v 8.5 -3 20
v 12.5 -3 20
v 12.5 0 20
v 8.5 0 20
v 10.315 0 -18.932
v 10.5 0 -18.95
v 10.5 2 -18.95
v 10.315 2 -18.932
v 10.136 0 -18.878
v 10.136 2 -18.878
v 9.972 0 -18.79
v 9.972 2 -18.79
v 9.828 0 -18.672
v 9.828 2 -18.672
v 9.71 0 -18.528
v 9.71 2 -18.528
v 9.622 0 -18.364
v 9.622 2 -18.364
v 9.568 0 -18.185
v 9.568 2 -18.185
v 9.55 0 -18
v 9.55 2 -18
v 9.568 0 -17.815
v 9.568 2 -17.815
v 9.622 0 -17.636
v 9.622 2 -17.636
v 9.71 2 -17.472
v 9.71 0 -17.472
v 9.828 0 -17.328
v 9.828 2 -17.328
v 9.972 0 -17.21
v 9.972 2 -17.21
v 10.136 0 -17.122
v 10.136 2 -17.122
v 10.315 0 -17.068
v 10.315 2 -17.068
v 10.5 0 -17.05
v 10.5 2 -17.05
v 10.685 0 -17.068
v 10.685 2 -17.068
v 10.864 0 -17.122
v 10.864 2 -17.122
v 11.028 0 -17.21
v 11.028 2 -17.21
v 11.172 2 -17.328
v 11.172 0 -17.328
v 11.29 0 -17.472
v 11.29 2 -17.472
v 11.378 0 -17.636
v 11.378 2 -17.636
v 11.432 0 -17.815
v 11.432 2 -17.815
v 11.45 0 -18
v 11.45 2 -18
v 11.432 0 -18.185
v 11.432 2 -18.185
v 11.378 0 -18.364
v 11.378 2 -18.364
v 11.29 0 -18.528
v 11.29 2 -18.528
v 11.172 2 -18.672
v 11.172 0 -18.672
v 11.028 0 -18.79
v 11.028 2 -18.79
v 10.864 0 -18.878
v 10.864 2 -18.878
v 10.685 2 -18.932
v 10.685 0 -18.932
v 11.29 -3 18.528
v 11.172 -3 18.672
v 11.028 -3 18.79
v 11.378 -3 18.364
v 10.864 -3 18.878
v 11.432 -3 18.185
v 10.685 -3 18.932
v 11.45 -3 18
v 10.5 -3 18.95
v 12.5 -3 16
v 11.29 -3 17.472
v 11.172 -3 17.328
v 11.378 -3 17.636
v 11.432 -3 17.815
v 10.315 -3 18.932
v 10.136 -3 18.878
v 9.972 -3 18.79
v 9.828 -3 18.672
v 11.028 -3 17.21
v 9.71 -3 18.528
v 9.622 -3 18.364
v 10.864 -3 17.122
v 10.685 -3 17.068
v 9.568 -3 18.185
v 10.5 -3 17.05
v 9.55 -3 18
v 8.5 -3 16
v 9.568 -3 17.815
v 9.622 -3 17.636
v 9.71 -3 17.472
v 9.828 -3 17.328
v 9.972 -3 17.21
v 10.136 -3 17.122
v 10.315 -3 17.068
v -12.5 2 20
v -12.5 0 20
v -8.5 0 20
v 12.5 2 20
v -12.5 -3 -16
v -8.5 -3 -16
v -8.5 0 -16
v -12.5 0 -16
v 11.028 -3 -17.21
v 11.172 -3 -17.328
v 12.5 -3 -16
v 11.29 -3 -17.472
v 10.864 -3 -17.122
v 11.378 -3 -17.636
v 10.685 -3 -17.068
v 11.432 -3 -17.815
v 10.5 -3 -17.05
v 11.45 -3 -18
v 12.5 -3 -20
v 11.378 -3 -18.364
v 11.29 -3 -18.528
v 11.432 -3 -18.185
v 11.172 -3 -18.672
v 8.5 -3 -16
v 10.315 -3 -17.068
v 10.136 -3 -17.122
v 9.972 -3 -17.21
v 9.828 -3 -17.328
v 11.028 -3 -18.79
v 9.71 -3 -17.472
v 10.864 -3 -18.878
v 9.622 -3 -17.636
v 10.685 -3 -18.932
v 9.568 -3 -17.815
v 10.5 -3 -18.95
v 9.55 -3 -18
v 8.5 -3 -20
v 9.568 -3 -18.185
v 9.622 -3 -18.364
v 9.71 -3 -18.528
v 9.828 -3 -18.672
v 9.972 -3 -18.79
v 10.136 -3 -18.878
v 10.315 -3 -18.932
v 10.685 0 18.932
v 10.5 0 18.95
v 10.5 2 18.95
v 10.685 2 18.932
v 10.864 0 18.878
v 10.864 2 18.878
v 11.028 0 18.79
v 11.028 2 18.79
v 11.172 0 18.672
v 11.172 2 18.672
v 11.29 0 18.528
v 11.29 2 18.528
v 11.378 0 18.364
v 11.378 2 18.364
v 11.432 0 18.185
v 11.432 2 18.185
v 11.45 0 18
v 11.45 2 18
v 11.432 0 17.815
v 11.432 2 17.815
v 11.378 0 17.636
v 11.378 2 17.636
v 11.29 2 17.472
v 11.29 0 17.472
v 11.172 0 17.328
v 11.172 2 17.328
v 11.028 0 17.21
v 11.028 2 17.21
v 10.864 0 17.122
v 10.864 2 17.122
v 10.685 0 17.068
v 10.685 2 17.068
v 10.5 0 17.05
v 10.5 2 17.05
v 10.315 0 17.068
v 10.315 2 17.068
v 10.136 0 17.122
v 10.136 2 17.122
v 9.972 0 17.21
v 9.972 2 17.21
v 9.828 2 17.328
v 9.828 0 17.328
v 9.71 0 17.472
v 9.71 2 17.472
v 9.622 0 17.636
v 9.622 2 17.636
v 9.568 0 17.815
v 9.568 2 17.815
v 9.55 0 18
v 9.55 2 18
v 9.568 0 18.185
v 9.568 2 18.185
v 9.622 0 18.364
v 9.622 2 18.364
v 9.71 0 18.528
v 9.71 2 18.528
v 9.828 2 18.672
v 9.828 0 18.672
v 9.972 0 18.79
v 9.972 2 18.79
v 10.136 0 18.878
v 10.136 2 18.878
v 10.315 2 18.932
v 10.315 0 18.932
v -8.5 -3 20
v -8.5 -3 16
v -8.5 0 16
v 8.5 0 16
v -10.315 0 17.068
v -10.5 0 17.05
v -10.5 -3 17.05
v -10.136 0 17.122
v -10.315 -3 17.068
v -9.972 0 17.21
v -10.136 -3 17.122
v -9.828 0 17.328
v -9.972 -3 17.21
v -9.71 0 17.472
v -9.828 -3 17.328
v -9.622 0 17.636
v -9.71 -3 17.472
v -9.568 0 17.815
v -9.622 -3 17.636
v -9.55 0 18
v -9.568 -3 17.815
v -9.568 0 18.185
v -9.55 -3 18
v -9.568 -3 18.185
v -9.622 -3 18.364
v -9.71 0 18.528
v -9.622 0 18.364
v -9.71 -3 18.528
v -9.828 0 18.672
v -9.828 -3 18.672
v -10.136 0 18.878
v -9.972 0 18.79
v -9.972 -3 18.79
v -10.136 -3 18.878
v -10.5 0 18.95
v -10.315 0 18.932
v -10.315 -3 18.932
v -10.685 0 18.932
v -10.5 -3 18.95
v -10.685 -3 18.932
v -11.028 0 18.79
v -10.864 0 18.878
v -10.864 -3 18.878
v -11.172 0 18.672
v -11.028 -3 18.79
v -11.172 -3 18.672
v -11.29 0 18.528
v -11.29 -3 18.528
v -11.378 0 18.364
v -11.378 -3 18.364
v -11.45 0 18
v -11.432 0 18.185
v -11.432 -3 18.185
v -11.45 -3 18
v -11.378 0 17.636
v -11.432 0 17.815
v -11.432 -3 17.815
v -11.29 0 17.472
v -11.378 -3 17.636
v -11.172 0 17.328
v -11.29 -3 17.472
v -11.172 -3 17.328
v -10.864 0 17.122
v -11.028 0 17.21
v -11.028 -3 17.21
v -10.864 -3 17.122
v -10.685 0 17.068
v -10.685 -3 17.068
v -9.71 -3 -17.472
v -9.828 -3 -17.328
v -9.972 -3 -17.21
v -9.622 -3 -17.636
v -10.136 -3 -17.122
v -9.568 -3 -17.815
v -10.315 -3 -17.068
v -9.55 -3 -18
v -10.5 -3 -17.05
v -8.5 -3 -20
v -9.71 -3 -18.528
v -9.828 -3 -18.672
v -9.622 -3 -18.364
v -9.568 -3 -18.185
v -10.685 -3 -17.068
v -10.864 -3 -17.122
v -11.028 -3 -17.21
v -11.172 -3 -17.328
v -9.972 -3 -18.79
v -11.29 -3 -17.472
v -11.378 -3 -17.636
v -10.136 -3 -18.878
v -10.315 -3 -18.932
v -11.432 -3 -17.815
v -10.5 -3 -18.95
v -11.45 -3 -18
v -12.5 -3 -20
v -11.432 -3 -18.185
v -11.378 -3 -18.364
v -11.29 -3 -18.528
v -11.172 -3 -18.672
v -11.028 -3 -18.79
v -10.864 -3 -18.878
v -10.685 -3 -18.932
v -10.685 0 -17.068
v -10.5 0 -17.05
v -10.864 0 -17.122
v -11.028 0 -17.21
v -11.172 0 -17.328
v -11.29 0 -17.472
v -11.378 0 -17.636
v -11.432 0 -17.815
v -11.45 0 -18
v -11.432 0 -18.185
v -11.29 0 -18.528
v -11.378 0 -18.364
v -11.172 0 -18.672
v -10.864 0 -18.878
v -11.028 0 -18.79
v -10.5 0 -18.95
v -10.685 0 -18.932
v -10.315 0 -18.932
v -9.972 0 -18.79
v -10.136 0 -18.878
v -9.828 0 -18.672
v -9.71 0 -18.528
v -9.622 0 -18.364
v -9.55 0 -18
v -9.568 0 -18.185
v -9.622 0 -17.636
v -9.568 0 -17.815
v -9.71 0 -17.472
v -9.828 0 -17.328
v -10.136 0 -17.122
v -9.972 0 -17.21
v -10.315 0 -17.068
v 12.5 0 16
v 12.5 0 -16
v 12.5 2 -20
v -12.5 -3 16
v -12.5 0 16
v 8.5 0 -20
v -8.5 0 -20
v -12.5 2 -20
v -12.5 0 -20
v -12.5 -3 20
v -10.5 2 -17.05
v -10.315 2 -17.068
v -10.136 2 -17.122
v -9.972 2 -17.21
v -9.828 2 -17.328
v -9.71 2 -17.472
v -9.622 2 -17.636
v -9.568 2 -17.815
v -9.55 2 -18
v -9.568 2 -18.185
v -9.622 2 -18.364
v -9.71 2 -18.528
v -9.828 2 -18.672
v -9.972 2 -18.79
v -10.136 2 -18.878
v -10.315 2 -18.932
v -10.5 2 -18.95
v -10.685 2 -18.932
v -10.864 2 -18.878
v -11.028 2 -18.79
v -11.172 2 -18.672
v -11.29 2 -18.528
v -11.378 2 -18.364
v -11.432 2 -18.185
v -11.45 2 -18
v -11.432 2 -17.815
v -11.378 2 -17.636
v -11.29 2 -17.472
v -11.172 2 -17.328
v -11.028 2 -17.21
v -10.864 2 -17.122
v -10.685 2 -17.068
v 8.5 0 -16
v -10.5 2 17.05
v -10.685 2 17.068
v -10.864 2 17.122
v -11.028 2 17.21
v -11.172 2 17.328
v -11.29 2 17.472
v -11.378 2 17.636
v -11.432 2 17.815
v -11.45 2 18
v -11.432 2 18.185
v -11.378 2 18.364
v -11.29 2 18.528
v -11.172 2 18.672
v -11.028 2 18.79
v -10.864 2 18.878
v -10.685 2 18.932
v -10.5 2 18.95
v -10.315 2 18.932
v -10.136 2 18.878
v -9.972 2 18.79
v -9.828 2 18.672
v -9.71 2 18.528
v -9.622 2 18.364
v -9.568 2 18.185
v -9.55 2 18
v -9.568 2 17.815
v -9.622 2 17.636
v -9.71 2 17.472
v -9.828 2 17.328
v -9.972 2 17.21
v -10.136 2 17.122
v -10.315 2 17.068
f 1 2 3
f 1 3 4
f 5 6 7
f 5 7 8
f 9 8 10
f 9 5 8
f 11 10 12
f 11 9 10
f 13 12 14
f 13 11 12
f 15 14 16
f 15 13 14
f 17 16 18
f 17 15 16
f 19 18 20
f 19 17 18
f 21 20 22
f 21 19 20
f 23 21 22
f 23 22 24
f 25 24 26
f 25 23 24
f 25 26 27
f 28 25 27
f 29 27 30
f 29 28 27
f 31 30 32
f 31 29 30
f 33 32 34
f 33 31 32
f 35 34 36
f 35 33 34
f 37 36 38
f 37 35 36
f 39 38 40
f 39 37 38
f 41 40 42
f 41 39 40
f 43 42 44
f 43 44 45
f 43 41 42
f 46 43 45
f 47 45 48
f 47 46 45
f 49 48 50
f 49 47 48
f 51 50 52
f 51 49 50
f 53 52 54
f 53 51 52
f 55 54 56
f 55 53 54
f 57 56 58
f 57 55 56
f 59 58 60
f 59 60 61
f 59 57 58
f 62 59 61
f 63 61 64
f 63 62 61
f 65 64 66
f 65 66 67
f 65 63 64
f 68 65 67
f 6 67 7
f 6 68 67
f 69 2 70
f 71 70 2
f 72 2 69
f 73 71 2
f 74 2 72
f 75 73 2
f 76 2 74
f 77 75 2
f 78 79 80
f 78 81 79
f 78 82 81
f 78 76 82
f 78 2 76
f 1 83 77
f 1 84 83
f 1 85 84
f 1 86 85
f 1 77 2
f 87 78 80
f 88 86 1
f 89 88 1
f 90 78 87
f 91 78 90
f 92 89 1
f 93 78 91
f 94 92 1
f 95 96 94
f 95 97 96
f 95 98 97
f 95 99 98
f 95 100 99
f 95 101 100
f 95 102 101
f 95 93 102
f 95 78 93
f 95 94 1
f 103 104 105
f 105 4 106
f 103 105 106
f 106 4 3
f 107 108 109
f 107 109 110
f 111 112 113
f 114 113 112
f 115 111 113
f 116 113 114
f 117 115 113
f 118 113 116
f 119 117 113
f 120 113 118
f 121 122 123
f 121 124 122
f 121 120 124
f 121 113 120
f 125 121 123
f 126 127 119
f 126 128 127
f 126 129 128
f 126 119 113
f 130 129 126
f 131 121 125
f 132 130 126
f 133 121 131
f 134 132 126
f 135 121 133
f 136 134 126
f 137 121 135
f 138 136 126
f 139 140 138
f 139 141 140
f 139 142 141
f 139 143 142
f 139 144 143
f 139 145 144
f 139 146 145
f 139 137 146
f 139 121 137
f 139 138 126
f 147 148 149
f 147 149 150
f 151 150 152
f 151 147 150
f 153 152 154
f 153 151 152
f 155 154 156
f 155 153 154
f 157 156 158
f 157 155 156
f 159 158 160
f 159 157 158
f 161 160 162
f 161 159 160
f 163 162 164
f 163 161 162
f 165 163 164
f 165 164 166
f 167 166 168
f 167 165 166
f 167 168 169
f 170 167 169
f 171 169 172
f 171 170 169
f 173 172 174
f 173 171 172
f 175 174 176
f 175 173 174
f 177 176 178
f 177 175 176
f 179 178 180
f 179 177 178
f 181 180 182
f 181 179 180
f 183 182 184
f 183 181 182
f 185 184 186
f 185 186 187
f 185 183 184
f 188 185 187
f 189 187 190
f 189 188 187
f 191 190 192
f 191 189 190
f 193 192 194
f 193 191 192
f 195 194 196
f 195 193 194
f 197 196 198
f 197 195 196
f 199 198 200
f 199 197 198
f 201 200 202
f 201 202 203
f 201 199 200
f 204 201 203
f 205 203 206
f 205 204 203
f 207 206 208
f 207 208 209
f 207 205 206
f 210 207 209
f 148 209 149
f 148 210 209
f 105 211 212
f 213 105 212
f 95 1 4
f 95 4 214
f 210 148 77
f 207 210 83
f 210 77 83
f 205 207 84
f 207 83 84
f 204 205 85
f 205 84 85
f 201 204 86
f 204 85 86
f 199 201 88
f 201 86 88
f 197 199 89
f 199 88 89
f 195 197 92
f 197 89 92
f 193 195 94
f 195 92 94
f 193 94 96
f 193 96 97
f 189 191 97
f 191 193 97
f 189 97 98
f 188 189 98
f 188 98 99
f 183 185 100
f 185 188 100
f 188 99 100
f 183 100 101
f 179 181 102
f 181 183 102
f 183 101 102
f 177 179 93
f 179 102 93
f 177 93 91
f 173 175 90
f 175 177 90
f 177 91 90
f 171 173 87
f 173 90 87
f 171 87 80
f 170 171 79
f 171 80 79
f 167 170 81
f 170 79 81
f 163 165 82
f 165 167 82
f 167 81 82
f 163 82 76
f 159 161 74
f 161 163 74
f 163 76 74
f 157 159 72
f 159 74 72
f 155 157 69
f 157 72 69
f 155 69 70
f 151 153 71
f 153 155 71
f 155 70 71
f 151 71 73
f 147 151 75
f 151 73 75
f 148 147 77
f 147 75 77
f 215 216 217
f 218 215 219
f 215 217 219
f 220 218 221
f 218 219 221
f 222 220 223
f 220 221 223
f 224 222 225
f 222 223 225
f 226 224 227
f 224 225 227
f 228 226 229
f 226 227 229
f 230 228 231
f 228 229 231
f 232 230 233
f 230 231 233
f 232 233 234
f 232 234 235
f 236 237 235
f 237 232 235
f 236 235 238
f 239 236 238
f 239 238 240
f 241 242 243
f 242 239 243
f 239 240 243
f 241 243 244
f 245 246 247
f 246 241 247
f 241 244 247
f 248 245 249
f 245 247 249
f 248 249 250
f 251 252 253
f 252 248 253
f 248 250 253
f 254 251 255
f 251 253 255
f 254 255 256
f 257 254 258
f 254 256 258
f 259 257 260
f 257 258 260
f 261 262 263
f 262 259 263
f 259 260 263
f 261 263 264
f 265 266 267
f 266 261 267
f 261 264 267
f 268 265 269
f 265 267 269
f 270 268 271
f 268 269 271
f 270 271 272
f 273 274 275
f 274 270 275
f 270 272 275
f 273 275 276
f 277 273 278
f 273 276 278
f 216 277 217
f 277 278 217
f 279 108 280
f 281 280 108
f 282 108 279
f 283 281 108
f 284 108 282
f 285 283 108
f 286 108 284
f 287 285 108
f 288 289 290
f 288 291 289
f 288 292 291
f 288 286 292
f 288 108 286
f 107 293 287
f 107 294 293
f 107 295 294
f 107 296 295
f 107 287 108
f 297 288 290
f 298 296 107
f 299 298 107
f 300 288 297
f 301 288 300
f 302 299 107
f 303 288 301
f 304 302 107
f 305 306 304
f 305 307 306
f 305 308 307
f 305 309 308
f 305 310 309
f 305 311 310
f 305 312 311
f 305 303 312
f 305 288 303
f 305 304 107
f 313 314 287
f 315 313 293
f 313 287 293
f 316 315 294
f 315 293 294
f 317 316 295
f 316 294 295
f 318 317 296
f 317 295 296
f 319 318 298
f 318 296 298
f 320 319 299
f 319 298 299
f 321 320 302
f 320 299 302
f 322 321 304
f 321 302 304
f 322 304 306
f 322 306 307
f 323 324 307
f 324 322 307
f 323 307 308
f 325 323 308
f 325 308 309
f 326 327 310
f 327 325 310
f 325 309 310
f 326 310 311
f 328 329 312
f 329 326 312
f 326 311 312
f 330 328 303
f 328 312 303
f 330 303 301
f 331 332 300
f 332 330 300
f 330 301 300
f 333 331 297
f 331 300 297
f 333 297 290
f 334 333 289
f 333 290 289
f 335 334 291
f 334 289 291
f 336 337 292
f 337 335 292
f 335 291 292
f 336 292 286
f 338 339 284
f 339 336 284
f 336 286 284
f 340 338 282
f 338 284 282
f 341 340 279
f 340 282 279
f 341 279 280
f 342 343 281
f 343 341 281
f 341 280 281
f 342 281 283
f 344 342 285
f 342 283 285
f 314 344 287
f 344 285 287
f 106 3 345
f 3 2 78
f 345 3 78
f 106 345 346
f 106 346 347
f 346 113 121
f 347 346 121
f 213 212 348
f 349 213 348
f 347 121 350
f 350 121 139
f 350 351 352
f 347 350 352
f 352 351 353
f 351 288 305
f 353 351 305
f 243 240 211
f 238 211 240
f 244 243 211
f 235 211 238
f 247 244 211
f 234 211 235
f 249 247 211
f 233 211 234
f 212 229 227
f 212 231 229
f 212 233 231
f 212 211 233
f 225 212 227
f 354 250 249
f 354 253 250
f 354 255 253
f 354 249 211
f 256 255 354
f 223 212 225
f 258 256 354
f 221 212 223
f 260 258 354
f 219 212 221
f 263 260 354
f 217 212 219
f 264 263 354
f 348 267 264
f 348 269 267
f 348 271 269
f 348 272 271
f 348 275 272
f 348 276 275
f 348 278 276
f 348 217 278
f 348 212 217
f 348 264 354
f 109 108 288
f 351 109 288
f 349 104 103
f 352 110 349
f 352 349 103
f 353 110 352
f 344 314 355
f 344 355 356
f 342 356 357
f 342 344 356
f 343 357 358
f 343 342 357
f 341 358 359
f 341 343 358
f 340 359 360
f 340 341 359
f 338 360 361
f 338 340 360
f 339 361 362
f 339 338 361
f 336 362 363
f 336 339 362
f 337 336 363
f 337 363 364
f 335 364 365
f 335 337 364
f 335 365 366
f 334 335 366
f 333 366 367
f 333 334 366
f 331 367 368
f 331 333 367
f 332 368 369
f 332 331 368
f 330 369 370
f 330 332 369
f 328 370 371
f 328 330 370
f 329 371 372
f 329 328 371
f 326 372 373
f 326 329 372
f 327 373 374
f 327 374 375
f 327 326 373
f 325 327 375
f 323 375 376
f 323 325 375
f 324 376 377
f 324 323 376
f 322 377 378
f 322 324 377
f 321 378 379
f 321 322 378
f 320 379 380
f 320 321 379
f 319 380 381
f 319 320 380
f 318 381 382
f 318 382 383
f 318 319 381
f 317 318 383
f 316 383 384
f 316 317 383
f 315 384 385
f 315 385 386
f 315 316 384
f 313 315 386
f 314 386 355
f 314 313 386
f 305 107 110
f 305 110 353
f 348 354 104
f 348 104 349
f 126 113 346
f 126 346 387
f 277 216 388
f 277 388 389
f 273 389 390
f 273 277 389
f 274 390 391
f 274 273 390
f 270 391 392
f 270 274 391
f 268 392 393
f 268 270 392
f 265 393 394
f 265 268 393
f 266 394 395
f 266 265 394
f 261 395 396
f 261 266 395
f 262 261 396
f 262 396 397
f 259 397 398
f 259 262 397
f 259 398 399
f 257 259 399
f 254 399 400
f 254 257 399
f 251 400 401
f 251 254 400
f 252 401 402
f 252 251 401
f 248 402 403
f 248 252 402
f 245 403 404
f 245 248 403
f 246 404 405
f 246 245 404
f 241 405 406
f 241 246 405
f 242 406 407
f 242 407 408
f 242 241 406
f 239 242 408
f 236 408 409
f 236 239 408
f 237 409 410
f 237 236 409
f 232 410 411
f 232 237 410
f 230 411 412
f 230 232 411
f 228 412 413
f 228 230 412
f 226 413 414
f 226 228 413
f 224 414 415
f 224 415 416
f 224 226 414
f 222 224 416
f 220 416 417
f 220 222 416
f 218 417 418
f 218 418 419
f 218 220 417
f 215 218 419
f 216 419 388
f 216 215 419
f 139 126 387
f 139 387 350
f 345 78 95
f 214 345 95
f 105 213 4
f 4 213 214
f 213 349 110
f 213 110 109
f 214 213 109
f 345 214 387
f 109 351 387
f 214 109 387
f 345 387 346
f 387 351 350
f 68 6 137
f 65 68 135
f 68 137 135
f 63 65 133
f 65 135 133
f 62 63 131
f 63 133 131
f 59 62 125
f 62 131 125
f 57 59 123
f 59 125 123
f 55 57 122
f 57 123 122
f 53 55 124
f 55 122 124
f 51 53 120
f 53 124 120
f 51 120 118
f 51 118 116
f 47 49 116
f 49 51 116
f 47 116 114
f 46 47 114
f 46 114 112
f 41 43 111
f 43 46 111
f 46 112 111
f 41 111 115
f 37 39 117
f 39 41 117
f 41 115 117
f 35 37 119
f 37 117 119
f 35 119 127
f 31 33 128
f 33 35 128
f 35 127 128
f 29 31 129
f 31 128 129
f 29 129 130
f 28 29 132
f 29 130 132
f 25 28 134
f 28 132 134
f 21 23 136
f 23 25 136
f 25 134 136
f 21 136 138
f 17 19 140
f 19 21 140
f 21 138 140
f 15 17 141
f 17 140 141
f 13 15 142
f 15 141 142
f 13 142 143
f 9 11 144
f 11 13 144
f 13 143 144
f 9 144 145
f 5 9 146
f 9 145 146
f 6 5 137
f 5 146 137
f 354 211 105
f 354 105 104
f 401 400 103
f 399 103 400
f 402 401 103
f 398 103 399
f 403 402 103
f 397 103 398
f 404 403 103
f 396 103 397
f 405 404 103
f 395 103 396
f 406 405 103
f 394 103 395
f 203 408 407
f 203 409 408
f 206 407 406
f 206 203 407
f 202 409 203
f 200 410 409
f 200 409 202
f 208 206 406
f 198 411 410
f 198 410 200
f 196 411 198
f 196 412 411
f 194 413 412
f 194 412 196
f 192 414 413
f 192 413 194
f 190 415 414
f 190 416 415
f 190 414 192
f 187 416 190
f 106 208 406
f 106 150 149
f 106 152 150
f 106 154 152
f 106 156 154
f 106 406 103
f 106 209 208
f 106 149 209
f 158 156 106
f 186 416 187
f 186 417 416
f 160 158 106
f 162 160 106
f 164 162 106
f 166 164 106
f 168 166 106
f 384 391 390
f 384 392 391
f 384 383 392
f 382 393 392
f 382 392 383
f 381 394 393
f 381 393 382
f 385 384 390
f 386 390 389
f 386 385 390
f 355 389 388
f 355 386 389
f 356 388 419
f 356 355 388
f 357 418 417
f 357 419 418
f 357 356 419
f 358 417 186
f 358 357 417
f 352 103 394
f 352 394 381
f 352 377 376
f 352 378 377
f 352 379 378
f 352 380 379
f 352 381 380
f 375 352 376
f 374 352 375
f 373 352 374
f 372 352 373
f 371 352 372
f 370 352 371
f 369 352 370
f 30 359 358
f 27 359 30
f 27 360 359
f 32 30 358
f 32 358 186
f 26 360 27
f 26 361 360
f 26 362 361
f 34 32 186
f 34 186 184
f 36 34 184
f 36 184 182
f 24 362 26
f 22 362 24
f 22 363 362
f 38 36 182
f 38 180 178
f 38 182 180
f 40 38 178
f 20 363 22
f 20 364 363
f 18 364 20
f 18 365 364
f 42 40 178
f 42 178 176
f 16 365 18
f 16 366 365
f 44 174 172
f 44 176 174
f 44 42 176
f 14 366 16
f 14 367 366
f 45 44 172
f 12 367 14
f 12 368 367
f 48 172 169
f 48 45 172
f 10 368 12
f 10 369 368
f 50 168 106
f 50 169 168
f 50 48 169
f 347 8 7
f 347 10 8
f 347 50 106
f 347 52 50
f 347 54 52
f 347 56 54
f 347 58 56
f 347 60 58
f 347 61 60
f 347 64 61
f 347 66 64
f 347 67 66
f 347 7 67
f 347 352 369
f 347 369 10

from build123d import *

# Parameters (mm, degrees)
SKETCH1_W           = 25
SKETCH1_H           = 40
SKETCH1_R           = 0.95
BOSS_EXTRUDE1_DEPTH = 2
BOSS_EXTRUDE2_START = 3
SKETCH2_W           = 4
SKETCH2_H           = 4
SKETCH2_R           = 0.95
BOSS_EXTRUDE2_DEPTH = 3


with BuildPart() as part:
    # Sketch1 → Boss-Extrude1 (new body)
    with BuildSketch(Plane(origin=(0, 0, 0), x_dir=(1, 0, 0), z_dir=(0, 1, 0))):
        Rectangle(SKETCH1_W, SKETCH1_H)
        with Locations(Location((-10.5, 18, 0), (0, 0, 270))):
            Circle(SKETCH1_R, mode=Mode.SUBTRACT)
        with Locations(Location((10.5, 18, 0), (0, 0, 90))):
            Circle(SKETCH1_R, mode=Mode.SUBTRACT)
        with Locations(Location((-10.5, -18, 0), (0, 0, 90))):
            Circle(SKETCH1_R, mode=Mode.SUBTRACT)
        with Locations(Location((10.5, -18, 0), (0, 0, 270))):
            Circle(SKETCH1_R, mode=Mode.SUBTRACT)
    extrude(amount=BOSS_EXTRUDE1_DEPTH)

    # Sketch2 → Boss-Extrude2 (add)
    # profile 1 of 4: a face of its own
    with BuildSketch(Plane(origin=(0, 0, 0), x_dir=(-1, 0, 0), z_dir=(0, -1, 0)).offset(BOSS_EXTRUDE2_START)):
        with Locations((-10.5, 18)):
            Rectangle(SKETCH2_W, SKETCH2_H)
        with Locations(Location((-10.5, 18, 0), (0, 0, 90))):
            Circle(SKETCH2_R, mode=Mode.SUBTRACT)
    # profile 2 of 4: a face of its own
    with BuildSketch(Plane(origin=(0, 0, 0), x_dir=(-1, 0, 0), z_dir=(0, -1, 0)).offset(BOSS_EXTRUDE2_START)):
        with Locations((10.5, 18)):
            Rectangle(SKETCH2_W, SKETCH2_H)
        with Locations(Location((10.5, 18, 0), (0, 0, 270))):
            Circle(SKETCH2_R, mode=Mode.SUBTRACT)
    # profile 3 of 4: a face of its own
    with BuildSketch(Plane(origin=(0, 0, 0), x_dir=(-1, 0, 0), z_dir=(0, -1, 0)).offset(BOSS_EXTRUDE2_START)):
        with Locations((-10.5, -18)):
            Rectangle(SKETCH2_W, SKETCH2_H)
        with Locations(Location((-10.5, -18, 0), (0, 0, 270))):
            Circle(SKETCH2_R, mode=Mode.SUBTRACT)
    # profile 4 of 4: a face of its own
    with BuildSketch(Plane(origin=(0, 0, 0), x_dir=(-1, 0, 0), z_dir=(0, -1, 0)).offset(BOSS_EXTRUDE2_START)):
        with Locations((10.5, -18)):
            Rectangle(SKETCH2_W, SKETCH2_H)
        with Locations(Location((10.5, -18, 0), (0, 0, 90))):
            Circle(SKETCH2_R, mode=Mode.SUBTRACT)
    extrude(amount=-BOSS_EXTRUDE2_DEPTH)


solid = part.part
